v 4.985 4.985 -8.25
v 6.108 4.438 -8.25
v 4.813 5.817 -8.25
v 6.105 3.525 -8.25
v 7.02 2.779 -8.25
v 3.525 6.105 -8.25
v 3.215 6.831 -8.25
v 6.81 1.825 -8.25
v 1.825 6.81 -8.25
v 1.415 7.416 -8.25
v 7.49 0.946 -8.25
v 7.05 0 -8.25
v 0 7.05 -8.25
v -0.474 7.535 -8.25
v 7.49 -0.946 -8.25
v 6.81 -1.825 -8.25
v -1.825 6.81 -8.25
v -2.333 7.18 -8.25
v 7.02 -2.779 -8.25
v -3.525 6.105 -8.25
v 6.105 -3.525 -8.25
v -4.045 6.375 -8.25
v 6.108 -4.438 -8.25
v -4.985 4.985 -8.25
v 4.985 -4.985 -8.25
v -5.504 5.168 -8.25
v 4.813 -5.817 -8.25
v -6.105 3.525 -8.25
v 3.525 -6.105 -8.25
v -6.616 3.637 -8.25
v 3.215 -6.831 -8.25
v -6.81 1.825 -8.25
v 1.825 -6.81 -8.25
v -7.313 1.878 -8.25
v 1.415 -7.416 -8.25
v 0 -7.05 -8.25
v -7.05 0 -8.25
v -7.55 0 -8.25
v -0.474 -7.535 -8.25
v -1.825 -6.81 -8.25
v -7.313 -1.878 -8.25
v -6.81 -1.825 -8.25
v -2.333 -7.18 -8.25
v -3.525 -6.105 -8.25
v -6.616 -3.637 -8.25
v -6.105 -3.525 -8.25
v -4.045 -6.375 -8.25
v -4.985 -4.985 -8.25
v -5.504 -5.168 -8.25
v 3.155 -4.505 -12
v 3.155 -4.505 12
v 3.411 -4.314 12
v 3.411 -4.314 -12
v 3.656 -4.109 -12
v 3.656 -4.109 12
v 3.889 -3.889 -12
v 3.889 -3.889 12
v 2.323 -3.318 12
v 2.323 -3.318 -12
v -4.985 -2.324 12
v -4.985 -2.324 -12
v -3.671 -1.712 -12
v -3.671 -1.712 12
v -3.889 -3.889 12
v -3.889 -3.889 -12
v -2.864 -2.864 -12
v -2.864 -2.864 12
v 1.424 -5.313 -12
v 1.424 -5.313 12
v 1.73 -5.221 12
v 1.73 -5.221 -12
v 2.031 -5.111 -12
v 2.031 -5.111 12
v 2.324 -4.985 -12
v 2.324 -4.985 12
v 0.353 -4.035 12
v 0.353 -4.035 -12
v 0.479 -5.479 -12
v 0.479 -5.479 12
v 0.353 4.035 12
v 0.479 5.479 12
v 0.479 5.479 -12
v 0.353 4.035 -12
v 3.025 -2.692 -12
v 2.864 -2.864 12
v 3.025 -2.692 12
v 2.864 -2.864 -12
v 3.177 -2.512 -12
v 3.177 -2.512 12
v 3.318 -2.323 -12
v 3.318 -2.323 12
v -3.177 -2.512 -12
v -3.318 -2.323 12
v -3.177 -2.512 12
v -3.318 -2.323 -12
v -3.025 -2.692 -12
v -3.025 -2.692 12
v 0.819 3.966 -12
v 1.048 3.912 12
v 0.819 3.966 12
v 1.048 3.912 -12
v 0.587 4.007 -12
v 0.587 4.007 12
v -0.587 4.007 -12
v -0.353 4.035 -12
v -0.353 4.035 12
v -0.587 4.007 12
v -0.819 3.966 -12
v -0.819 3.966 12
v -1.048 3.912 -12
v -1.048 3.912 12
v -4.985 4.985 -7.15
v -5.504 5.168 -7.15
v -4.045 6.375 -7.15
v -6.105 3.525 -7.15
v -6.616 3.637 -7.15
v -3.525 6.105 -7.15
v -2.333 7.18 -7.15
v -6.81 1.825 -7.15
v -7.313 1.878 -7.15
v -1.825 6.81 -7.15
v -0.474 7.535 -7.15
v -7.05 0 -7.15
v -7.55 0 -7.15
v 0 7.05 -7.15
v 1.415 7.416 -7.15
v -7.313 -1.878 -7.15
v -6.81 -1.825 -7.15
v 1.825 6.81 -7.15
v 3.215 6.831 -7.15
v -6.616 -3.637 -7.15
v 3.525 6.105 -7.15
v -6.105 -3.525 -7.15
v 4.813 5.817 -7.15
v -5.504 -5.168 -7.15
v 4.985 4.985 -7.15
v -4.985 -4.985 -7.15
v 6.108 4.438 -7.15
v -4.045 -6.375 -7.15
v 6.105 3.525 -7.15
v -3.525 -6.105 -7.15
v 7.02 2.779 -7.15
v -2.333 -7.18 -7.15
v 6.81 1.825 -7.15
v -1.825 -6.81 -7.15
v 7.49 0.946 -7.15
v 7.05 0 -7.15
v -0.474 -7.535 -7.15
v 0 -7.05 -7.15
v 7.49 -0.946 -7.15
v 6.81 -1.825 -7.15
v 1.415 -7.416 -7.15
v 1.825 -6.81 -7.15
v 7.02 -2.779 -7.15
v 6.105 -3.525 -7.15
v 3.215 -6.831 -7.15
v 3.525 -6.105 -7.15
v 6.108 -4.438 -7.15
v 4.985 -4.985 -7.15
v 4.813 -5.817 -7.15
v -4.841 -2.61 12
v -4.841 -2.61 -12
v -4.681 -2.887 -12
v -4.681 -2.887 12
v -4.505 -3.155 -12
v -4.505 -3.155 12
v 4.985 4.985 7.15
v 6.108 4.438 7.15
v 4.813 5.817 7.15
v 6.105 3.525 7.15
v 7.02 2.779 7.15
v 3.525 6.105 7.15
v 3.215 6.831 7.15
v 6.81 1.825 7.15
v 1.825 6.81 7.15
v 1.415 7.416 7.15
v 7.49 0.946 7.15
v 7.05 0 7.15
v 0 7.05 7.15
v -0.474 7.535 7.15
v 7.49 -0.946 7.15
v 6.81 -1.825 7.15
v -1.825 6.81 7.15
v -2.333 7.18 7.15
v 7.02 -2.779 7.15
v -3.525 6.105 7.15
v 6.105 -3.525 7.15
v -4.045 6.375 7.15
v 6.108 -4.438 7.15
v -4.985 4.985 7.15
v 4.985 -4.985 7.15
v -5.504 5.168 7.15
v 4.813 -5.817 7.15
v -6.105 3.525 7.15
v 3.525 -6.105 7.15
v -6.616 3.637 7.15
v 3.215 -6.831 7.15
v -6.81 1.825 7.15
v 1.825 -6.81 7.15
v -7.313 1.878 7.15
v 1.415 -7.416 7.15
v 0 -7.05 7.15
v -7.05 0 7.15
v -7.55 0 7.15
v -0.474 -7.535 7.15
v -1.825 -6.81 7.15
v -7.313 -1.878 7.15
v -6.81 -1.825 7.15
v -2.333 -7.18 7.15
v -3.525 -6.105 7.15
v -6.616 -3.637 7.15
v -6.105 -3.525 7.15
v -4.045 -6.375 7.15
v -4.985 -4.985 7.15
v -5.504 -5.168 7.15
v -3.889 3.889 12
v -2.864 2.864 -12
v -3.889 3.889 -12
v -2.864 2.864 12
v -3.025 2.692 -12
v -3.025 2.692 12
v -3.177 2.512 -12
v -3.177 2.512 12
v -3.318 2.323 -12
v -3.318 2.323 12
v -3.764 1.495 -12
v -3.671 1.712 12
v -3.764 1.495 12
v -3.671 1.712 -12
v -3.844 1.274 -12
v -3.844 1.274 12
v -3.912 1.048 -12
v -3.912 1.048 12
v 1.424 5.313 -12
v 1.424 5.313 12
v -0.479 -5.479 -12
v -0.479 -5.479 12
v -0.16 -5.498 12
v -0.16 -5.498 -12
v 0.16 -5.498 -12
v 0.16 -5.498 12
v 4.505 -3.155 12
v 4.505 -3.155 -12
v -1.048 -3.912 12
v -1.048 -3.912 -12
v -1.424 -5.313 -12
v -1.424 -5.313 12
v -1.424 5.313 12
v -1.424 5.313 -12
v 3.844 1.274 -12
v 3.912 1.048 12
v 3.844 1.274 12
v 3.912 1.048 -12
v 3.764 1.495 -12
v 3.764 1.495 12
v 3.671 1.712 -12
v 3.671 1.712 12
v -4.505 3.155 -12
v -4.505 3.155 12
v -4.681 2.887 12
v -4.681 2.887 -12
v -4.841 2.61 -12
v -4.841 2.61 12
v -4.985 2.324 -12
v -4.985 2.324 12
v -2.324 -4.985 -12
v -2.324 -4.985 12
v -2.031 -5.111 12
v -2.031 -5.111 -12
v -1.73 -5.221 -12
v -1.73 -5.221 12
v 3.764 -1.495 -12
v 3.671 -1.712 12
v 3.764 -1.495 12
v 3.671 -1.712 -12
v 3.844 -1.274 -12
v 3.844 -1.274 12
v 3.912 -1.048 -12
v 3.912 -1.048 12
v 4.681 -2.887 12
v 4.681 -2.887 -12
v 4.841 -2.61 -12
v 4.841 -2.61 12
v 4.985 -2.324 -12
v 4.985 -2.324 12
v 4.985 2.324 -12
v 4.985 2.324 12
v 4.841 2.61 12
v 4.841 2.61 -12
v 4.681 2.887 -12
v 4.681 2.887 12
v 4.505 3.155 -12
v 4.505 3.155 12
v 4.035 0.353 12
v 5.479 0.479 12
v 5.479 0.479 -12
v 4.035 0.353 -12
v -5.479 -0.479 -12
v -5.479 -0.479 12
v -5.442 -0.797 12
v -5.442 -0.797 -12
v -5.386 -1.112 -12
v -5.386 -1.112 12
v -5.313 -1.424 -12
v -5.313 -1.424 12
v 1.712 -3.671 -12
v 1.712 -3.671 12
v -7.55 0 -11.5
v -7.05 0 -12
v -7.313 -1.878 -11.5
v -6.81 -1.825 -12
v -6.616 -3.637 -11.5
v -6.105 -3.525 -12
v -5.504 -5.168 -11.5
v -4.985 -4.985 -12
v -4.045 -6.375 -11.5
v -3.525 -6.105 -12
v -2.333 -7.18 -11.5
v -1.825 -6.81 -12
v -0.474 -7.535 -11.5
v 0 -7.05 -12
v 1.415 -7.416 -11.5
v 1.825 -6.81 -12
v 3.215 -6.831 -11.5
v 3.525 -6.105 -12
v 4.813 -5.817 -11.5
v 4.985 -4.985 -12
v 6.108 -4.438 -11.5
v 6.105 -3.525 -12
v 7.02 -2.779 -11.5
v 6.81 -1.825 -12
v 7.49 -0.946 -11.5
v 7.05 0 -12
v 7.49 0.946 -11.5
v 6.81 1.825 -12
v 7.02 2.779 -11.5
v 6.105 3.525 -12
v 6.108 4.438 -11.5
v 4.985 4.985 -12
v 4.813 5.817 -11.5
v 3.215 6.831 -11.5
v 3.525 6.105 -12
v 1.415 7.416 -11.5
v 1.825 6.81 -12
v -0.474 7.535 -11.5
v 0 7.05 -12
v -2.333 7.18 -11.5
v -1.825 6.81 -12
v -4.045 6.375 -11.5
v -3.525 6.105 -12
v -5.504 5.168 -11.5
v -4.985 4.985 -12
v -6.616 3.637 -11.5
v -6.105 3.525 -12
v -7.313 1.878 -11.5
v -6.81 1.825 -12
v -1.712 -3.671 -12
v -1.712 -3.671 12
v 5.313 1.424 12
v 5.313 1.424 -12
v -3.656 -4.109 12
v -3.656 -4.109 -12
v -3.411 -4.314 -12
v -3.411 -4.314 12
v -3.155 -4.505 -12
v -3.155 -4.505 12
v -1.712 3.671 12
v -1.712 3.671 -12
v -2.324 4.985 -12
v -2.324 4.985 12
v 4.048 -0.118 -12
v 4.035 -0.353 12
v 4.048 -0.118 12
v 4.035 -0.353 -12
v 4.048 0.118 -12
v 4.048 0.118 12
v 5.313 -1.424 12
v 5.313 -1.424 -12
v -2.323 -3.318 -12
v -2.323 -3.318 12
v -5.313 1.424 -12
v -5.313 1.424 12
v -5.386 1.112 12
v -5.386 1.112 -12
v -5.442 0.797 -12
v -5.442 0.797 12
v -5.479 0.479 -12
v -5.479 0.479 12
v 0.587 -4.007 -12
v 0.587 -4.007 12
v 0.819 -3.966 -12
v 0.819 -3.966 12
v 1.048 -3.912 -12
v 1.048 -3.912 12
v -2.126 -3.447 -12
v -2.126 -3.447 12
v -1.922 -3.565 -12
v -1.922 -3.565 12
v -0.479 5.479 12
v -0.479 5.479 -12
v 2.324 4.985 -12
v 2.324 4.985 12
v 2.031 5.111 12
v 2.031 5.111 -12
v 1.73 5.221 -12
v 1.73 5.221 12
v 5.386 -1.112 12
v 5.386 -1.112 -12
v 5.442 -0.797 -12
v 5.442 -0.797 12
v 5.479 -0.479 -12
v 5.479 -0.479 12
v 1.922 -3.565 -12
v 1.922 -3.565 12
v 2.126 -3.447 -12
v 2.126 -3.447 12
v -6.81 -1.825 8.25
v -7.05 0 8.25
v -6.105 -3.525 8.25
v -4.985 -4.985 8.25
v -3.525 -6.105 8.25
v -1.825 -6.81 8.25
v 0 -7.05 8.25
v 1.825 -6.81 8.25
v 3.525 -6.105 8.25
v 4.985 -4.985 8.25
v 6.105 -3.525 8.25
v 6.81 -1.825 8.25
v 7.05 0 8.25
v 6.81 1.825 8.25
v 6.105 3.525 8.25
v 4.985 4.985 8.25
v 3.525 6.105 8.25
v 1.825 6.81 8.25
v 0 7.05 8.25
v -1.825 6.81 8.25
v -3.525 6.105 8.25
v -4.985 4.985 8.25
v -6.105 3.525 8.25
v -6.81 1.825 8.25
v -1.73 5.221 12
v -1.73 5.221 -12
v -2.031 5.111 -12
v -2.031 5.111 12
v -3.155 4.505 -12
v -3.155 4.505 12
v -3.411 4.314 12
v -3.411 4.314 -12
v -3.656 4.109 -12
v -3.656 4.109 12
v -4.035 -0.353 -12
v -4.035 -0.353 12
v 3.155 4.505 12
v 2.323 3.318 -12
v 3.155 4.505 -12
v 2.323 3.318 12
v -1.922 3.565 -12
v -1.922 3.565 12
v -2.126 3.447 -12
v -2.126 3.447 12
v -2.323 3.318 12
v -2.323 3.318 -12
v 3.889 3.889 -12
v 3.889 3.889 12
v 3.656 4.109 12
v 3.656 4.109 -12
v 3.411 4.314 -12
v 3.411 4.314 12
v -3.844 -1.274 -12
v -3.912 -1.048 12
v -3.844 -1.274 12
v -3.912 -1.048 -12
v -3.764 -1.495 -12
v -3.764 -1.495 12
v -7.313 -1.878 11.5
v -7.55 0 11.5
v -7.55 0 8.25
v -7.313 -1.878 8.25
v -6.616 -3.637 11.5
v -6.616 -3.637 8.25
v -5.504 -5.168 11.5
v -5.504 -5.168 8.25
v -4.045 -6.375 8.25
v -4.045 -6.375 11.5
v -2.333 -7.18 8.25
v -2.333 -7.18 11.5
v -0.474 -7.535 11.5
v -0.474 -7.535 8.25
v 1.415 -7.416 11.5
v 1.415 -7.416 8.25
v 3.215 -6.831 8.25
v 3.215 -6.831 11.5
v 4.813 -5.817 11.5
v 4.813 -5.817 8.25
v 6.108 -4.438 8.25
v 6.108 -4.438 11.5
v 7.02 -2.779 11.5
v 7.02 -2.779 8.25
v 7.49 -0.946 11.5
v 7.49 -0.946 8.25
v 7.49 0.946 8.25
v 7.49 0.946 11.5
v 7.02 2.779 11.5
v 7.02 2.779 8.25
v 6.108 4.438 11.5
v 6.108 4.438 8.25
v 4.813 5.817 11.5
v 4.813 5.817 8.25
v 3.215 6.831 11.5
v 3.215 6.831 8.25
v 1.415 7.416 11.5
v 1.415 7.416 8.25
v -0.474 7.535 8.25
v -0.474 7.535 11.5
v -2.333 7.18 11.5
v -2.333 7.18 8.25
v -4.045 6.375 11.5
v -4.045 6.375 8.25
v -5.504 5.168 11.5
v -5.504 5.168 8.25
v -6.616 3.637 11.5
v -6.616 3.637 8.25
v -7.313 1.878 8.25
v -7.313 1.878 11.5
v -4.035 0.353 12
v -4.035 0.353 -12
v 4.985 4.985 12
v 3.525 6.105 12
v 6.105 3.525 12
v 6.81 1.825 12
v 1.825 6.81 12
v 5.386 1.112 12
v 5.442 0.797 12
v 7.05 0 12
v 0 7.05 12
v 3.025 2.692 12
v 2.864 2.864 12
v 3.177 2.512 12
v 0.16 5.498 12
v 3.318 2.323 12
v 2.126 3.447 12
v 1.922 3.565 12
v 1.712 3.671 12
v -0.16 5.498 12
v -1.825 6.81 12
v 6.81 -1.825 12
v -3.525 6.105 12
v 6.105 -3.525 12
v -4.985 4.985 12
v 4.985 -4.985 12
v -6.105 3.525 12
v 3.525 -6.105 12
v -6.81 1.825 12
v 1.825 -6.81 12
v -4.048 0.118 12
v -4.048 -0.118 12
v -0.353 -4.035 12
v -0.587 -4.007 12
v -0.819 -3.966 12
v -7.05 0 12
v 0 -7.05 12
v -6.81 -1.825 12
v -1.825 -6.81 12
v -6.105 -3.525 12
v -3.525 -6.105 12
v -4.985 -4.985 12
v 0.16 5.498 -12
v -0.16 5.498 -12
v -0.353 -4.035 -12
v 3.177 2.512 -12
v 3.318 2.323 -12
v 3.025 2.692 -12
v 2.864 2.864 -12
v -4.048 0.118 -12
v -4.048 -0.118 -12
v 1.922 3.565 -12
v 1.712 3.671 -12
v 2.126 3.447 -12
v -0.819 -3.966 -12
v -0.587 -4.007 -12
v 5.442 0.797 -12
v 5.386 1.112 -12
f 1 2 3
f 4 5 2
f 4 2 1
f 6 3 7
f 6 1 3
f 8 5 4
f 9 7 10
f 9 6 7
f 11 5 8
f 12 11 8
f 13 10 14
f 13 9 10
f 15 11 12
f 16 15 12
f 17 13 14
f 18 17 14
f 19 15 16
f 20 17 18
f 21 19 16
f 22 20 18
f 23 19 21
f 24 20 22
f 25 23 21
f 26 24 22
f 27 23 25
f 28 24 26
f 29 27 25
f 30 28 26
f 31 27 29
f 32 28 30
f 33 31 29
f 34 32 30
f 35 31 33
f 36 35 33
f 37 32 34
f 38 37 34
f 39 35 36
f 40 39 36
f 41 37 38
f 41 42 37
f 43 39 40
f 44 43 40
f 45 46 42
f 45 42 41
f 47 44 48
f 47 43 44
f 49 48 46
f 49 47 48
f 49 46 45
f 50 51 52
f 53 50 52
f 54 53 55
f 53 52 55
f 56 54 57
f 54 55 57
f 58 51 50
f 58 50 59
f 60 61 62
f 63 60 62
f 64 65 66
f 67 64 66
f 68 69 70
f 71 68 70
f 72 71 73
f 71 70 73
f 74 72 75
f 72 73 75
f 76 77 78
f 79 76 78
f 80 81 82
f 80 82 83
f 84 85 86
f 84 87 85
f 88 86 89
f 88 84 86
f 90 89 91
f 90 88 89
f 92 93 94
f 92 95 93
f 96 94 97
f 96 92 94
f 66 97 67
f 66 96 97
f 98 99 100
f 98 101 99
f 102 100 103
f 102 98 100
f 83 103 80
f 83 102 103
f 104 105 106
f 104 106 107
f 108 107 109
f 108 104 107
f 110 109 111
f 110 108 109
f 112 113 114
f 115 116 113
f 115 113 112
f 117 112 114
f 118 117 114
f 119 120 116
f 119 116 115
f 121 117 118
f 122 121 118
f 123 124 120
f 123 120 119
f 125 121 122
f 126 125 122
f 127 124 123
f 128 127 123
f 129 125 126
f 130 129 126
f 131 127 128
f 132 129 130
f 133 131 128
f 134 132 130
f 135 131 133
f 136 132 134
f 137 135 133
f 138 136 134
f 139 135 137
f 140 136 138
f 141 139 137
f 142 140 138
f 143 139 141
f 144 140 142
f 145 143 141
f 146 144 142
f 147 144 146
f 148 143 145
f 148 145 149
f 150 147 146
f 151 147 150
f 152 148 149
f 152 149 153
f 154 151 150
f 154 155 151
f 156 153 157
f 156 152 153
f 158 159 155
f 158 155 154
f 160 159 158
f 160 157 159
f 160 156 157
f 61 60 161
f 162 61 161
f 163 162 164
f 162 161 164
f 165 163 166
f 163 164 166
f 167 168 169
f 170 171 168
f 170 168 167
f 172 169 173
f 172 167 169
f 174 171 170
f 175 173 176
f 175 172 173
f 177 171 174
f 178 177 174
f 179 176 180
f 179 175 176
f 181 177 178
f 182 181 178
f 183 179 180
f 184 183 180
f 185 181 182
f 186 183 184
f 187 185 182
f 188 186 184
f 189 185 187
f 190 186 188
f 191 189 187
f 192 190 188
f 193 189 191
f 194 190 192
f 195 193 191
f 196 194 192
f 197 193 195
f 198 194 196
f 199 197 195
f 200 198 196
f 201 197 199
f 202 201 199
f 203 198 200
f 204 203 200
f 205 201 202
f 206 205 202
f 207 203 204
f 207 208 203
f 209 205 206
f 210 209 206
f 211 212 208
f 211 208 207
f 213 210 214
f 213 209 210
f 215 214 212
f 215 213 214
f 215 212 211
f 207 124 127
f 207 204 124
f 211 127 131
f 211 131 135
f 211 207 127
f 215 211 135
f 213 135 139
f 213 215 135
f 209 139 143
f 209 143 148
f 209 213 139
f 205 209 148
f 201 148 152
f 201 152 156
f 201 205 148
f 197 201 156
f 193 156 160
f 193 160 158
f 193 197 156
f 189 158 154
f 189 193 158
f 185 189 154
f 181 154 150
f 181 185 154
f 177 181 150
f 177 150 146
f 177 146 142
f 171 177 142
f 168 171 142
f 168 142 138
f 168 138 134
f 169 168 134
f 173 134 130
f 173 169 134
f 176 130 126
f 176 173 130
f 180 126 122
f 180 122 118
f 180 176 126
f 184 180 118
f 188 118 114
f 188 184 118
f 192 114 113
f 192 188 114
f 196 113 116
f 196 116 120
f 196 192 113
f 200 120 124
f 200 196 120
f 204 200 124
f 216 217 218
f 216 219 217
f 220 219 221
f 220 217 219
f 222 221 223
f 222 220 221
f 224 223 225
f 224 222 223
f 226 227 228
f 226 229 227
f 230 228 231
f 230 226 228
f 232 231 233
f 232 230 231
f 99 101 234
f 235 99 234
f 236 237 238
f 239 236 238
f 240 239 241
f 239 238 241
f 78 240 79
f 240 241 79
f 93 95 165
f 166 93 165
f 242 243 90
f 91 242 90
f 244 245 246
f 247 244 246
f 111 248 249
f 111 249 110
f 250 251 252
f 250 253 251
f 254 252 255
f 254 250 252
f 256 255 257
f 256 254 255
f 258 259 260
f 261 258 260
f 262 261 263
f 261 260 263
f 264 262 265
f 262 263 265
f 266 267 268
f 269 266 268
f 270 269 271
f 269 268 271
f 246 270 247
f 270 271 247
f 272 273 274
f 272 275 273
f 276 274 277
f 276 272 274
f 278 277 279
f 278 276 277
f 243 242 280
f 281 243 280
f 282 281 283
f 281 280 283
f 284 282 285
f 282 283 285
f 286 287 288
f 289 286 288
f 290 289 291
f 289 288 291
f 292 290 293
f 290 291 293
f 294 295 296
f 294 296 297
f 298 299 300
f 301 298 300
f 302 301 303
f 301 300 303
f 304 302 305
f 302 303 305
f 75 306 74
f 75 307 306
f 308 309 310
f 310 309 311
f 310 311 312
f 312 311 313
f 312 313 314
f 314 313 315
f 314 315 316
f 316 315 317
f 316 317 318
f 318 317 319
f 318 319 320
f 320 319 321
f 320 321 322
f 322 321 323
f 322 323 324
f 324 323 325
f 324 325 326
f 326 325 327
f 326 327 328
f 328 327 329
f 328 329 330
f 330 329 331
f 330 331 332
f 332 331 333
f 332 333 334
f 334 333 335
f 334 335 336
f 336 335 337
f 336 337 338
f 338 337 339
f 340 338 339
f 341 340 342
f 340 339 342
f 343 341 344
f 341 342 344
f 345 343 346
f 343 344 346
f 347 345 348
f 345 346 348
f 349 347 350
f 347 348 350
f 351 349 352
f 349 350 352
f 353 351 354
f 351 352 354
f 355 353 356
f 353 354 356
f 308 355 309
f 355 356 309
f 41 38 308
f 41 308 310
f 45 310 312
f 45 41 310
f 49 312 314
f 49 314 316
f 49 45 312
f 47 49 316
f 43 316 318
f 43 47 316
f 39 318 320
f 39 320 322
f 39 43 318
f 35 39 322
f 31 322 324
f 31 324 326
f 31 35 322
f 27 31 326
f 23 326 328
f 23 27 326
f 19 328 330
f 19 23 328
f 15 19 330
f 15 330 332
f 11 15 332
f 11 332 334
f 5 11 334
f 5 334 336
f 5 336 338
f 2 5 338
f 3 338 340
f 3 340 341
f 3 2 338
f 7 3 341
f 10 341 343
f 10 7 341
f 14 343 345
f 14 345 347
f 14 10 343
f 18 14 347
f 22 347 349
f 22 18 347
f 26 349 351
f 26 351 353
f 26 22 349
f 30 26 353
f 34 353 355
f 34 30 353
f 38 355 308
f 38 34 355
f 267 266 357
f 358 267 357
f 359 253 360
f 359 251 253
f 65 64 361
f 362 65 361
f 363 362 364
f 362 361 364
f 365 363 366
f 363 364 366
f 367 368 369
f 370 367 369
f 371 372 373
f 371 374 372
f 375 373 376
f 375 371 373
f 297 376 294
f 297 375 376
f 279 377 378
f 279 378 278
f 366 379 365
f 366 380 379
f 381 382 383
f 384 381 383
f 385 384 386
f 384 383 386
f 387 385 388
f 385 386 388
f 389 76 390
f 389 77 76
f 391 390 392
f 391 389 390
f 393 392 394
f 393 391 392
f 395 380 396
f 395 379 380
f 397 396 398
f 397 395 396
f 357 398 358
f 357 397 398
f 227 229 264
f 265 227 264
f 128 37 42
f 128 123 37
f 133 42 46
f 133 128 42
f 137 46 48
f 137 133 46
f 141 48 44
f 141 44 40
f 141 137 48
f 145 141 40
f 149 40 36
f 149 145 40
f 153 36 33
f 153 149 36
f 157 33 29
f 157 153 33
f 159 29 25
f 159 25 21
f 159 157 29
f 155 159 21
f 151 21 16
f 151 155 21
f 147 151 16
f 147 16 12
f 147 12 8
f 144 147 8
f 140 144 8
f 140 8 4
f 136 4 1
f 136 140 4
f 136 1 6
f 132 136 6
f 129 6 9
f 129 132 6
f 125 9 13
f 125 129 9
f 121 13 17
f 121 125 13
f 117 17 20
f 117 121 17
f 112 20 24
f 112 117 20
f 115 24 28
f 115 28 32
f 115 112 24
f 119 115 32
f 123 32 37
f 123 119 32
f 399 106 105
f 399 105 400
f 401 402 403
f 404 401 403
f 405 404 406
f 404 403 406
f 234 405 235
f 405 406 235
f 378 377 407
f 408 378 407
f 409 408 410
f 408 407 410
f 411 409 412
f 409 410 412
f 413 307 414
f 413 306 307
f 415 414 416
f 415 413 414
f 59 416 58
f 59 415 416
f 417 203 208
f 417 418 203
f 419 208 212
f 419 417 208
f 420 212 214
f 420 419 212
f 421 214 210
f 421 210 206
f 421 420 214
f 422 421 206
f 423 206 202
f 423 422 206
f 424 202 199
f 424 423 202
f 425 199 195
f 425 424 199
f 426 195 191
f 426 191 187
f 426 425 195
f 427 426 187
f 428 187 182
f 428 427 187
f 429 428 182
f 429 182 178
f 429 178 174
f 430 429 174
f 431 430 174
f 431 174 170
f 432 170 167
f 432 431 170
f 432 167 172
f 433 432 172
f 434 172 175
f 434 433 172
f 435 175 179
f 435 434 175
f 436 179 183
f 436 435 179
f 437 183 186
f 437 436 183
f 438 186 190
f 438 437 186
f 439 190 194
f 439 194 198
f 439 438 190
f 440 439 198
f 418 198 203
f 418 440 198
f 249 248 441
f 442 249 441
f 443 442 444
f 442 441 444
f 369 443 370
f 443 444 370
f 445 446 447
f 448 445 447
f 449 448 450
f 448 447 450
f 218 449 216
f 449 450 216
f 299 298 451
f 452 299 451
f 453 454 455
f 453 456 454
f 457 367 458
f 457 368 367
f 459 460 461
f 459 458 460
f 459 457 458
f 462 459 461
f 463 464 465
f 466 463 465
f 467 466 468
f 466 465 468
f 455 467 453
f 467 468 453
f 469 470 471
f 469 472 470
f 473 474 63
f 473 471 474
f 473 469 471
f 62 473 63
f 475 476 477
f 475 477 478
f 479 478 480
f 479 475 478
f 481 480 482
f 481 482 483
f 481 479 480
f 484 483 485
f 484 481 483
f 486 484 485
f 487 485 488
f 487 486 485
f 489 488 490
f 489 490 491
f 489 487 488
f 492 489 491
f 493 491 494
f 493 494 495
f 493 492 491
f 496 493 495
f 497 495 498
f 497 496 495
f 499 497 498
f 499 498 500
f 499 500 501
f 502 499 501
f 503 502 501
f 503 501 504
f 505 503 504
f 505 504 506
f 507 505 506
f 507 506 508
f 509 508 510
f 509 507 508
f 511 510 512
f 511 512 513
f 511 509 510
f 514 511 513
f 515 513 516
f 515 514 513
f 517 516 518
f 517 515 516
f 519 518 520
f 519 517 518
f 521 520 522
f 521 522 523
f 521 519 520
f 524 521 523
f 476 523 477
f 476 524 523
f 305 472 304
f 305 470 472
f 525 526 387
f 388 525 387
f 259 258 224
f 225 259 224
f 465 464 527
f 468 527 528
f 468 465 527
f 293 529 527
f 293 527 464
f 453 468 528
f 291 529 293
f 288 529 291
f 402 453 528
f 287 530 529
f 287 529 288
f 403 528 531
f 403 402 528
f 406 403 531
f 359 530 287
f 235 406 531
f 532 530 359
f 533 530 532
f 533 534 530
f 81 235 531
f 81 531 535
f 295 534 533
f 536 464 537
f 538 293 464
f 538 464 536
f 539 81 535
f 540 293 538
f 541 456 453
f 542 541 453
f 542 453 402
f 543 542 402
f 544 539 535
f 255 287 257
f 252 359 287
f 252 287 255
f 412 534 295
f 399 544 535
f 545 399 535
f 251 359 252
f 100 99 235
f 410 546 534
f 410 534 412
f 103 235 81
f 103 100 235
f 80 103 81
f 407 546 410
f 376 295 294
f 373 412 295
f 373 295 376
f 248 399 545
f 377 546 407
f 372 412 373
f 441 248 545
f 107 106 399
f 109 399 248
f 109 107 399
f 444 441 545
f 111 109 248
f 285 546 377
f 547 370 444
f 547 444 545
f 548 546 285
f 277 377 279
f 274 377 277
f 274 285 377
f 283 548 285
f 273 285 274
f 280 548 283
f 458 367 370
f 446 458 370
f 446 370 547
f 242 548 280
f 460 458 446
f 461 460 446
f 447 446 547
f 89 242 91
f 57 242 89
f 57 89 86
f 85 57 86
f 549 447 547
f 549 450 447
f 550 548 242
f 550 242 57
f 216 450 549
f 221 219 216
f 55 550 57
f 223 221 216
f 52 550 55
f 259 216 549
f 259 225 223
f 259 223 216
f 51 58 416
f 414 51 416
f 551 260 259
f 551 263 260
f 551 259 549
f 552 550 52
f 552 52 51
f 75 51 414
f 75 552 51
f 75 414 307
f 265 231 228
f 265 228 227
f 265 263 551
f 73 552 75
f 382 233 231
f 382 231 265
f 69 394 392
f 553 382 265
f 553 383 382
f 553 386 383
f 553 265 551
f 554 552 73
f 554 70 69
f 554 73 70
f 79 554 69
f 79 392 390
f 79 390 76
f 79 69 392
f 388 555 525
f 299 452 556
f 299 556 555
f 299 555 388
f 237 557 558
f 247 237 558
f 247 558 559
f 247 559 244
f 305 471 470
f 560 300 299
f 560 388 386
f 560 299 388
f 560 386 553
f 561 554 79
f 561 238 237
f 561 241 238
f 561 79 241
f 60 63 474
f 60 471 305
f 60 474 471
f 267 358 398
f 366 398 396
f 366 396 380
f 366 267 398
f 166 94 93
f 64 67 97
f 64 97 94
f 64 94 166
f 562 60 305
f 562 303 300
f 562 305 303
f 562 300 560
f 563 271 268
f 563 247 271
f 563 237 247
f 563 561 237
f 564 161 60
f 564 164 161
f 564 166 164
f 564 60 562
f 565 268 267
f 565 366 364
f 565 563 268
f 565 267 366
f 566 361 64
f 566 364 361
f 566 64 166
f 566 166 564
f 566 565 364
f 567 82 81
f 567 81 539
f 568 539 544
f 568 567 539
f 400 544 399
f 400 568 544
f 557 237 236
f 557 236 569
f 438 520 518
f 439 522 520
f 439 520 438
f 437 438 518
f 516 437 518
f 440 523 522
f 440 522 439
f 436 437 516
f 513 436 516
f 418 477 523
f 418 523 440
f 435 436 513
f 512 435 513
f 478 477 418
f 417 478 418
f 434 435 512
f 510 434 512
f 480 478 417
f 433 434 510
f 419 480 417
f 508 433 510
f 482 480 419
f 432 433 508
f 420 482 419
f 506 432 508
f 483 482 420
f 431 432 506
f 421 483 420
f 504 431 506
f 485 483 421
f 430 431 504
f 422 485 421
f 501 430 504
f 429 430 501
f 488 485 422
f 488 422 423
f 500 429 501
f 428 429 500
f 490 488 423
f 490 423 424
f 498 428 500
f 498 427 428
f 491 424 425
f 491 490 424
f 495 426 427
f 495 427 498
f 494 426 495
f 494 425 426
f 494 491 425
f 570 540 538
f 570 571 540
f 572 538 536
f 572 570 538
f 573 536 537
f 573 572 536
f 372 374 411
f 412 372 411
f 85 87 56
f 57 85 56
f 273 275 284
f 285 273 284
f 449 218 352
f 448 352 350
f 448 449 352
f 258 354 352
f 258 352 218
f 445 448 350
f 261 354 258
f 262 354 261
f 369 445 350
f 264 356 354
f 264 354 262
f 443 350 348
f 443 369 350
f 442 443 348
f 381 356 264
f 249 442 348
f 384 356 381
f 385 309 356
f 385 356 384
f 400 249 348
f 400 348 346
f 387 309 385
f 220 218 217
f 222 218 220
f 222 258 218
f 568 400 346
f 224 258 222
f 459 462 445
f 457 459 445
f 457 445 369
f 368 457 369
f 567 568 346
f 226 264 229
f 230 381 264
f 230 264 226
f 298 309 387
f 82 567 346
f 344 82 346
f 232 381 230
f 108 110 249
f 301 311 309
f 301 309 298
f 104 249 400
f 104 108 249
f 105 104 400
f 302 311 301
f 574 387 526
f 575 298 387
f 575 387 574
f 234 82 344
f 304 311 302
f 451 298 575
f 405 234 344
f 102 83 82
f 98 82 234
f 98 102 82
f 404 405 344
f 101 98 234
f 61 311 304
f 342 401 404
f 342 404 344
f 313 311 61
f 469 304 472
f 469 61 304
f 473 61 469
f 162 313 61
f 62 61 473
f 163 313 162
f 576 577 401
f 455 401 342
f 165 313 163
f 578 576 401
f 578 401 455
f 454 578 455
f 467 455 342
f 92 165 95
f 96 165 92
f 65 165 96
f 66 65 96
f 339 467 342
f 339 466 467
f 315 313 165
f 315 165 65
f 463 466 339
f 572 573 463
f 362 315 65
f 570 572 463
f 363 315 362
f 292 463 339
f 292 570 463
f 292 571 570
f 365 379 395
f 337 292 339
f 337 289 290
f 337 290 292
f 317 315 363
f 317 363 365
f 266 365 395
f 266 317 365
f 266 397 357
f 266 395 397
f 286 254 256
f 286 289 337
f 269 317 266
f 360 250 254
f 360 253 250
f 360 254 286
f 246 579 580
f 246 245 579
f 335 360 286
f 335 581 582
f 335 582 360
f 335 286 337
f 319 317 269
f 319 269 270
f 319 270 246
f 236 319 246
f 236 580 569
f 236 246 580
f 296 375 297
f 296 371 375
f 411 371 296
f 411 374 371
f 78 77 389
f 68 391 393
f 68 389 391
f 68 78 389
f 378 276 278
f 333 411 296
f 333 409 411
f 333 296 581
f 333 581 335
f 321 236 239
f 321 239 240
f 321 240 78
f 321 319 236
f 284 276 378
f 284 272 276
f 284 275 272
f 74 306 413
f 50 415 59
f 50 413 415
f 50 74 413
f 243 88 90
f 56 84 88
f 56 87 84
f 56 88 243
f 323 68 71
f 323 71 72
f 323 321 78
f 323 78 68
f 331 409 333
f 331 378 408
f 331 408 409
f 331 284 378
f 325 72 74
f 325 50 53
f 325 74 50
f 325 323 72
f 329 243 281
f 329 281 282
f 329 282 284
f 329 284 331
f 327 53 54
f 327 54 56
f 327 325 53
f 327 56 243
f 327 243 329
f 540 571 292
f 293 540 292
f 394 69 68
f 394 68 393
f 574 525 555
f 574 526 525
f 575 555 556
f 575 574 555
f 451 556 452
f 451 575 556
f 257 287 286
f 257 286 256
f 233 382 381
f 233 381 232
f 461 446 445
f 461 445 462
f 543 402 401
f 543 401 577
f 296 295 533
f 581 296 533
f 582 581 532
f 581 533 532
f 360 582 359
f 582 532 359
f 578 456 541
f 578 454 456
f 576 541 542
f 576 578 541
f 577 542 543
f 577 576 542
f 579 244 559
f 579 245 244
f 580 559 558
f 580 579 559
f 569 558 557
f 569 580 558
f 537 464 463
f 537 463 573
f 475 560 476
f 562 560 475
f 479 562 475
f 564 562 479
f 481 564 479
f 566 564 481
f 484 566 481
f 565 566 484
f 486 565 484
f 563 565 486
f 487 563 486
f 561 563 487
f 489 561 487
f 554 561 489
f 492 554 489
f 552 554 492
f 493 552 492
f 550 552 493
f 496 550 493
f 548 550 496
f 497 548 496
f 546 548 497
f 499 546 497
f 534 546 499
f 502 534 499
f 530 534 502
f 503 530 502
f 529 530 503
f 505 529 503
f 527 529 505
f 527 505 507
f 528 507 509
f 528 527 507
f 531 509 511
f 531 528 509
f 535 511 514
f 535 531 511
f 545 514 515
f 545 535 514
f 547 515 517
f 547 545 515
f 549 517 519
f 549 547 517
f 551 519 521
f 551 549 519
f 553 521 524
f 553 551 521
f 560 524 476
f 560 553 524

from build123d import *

# Parameters (mm, degrees)
POCKET_DEPTH       = 76.251136
POCKET_DEPTH_BACK  = 76.251136
POLARPATTERN_COUNT = 18
CHAMFER_SIZE       = 0.5


with BuildPart() as part:
    # Sketch → Revolution (revolve)
    with BuildSketch(Plane.XZ):
        Polygon((-7.55, 7.15), (-7.05, 7.15), (-7.05, 8.25), (-7.55, 8.25), (-7.55, 12), (-4.05, 12), (-4.05, -12), (-7.55, -12), (-7.55, -8.25), (-7.05, -8.25), (-7.05, -7.15), (-7.55, -7.15), align=None)
    revolve(axis=Axis((0, 0, 0), (0, 0, 1)))

    # Sketch001 → Pocket (cut, two sides)
    with BuildSketch(Plane.XY) as pocket_sk:
        with BuildLine():
            Line((0, 0), (-0.479357, 5.479071))
            ThreePointArc((0.479357, 5.479071), (0, 5.5), (-0.479357, 5.479071))
            Line((0.479357, 5.479071), (0, 0))
        make_face()
    pocket = extrude(amount=-POCKET_DEPTH, mode=Mode.SUBTRACT) + extrude(pocket_sk.sketch, amount=POCKET_DEPTH_BACK, mode=Mode.SUBTRACT)

    # PolarPattern: Pocket ×18 about axis
    polarpattern_axis = Axis((0, 0, 0), (0, 0, 1))
    for i in range(1, POLARPATTERN_COUNT):
        add(pocket.rotate(polarpattern_axis, i * 360 / POLARPATTERN_COUNT), mode=Mode.SUBTRACT)

    # Chamfer
    chamfer_edges = [part.edges().sort_by_distance(p)[0] for p in [
        (7.55, 0, 12),
        (7.55, 0, -12),
    ]]
    chamfer(chamfer_edges, length=CHAMFER_SIZE)


solid = part.part
